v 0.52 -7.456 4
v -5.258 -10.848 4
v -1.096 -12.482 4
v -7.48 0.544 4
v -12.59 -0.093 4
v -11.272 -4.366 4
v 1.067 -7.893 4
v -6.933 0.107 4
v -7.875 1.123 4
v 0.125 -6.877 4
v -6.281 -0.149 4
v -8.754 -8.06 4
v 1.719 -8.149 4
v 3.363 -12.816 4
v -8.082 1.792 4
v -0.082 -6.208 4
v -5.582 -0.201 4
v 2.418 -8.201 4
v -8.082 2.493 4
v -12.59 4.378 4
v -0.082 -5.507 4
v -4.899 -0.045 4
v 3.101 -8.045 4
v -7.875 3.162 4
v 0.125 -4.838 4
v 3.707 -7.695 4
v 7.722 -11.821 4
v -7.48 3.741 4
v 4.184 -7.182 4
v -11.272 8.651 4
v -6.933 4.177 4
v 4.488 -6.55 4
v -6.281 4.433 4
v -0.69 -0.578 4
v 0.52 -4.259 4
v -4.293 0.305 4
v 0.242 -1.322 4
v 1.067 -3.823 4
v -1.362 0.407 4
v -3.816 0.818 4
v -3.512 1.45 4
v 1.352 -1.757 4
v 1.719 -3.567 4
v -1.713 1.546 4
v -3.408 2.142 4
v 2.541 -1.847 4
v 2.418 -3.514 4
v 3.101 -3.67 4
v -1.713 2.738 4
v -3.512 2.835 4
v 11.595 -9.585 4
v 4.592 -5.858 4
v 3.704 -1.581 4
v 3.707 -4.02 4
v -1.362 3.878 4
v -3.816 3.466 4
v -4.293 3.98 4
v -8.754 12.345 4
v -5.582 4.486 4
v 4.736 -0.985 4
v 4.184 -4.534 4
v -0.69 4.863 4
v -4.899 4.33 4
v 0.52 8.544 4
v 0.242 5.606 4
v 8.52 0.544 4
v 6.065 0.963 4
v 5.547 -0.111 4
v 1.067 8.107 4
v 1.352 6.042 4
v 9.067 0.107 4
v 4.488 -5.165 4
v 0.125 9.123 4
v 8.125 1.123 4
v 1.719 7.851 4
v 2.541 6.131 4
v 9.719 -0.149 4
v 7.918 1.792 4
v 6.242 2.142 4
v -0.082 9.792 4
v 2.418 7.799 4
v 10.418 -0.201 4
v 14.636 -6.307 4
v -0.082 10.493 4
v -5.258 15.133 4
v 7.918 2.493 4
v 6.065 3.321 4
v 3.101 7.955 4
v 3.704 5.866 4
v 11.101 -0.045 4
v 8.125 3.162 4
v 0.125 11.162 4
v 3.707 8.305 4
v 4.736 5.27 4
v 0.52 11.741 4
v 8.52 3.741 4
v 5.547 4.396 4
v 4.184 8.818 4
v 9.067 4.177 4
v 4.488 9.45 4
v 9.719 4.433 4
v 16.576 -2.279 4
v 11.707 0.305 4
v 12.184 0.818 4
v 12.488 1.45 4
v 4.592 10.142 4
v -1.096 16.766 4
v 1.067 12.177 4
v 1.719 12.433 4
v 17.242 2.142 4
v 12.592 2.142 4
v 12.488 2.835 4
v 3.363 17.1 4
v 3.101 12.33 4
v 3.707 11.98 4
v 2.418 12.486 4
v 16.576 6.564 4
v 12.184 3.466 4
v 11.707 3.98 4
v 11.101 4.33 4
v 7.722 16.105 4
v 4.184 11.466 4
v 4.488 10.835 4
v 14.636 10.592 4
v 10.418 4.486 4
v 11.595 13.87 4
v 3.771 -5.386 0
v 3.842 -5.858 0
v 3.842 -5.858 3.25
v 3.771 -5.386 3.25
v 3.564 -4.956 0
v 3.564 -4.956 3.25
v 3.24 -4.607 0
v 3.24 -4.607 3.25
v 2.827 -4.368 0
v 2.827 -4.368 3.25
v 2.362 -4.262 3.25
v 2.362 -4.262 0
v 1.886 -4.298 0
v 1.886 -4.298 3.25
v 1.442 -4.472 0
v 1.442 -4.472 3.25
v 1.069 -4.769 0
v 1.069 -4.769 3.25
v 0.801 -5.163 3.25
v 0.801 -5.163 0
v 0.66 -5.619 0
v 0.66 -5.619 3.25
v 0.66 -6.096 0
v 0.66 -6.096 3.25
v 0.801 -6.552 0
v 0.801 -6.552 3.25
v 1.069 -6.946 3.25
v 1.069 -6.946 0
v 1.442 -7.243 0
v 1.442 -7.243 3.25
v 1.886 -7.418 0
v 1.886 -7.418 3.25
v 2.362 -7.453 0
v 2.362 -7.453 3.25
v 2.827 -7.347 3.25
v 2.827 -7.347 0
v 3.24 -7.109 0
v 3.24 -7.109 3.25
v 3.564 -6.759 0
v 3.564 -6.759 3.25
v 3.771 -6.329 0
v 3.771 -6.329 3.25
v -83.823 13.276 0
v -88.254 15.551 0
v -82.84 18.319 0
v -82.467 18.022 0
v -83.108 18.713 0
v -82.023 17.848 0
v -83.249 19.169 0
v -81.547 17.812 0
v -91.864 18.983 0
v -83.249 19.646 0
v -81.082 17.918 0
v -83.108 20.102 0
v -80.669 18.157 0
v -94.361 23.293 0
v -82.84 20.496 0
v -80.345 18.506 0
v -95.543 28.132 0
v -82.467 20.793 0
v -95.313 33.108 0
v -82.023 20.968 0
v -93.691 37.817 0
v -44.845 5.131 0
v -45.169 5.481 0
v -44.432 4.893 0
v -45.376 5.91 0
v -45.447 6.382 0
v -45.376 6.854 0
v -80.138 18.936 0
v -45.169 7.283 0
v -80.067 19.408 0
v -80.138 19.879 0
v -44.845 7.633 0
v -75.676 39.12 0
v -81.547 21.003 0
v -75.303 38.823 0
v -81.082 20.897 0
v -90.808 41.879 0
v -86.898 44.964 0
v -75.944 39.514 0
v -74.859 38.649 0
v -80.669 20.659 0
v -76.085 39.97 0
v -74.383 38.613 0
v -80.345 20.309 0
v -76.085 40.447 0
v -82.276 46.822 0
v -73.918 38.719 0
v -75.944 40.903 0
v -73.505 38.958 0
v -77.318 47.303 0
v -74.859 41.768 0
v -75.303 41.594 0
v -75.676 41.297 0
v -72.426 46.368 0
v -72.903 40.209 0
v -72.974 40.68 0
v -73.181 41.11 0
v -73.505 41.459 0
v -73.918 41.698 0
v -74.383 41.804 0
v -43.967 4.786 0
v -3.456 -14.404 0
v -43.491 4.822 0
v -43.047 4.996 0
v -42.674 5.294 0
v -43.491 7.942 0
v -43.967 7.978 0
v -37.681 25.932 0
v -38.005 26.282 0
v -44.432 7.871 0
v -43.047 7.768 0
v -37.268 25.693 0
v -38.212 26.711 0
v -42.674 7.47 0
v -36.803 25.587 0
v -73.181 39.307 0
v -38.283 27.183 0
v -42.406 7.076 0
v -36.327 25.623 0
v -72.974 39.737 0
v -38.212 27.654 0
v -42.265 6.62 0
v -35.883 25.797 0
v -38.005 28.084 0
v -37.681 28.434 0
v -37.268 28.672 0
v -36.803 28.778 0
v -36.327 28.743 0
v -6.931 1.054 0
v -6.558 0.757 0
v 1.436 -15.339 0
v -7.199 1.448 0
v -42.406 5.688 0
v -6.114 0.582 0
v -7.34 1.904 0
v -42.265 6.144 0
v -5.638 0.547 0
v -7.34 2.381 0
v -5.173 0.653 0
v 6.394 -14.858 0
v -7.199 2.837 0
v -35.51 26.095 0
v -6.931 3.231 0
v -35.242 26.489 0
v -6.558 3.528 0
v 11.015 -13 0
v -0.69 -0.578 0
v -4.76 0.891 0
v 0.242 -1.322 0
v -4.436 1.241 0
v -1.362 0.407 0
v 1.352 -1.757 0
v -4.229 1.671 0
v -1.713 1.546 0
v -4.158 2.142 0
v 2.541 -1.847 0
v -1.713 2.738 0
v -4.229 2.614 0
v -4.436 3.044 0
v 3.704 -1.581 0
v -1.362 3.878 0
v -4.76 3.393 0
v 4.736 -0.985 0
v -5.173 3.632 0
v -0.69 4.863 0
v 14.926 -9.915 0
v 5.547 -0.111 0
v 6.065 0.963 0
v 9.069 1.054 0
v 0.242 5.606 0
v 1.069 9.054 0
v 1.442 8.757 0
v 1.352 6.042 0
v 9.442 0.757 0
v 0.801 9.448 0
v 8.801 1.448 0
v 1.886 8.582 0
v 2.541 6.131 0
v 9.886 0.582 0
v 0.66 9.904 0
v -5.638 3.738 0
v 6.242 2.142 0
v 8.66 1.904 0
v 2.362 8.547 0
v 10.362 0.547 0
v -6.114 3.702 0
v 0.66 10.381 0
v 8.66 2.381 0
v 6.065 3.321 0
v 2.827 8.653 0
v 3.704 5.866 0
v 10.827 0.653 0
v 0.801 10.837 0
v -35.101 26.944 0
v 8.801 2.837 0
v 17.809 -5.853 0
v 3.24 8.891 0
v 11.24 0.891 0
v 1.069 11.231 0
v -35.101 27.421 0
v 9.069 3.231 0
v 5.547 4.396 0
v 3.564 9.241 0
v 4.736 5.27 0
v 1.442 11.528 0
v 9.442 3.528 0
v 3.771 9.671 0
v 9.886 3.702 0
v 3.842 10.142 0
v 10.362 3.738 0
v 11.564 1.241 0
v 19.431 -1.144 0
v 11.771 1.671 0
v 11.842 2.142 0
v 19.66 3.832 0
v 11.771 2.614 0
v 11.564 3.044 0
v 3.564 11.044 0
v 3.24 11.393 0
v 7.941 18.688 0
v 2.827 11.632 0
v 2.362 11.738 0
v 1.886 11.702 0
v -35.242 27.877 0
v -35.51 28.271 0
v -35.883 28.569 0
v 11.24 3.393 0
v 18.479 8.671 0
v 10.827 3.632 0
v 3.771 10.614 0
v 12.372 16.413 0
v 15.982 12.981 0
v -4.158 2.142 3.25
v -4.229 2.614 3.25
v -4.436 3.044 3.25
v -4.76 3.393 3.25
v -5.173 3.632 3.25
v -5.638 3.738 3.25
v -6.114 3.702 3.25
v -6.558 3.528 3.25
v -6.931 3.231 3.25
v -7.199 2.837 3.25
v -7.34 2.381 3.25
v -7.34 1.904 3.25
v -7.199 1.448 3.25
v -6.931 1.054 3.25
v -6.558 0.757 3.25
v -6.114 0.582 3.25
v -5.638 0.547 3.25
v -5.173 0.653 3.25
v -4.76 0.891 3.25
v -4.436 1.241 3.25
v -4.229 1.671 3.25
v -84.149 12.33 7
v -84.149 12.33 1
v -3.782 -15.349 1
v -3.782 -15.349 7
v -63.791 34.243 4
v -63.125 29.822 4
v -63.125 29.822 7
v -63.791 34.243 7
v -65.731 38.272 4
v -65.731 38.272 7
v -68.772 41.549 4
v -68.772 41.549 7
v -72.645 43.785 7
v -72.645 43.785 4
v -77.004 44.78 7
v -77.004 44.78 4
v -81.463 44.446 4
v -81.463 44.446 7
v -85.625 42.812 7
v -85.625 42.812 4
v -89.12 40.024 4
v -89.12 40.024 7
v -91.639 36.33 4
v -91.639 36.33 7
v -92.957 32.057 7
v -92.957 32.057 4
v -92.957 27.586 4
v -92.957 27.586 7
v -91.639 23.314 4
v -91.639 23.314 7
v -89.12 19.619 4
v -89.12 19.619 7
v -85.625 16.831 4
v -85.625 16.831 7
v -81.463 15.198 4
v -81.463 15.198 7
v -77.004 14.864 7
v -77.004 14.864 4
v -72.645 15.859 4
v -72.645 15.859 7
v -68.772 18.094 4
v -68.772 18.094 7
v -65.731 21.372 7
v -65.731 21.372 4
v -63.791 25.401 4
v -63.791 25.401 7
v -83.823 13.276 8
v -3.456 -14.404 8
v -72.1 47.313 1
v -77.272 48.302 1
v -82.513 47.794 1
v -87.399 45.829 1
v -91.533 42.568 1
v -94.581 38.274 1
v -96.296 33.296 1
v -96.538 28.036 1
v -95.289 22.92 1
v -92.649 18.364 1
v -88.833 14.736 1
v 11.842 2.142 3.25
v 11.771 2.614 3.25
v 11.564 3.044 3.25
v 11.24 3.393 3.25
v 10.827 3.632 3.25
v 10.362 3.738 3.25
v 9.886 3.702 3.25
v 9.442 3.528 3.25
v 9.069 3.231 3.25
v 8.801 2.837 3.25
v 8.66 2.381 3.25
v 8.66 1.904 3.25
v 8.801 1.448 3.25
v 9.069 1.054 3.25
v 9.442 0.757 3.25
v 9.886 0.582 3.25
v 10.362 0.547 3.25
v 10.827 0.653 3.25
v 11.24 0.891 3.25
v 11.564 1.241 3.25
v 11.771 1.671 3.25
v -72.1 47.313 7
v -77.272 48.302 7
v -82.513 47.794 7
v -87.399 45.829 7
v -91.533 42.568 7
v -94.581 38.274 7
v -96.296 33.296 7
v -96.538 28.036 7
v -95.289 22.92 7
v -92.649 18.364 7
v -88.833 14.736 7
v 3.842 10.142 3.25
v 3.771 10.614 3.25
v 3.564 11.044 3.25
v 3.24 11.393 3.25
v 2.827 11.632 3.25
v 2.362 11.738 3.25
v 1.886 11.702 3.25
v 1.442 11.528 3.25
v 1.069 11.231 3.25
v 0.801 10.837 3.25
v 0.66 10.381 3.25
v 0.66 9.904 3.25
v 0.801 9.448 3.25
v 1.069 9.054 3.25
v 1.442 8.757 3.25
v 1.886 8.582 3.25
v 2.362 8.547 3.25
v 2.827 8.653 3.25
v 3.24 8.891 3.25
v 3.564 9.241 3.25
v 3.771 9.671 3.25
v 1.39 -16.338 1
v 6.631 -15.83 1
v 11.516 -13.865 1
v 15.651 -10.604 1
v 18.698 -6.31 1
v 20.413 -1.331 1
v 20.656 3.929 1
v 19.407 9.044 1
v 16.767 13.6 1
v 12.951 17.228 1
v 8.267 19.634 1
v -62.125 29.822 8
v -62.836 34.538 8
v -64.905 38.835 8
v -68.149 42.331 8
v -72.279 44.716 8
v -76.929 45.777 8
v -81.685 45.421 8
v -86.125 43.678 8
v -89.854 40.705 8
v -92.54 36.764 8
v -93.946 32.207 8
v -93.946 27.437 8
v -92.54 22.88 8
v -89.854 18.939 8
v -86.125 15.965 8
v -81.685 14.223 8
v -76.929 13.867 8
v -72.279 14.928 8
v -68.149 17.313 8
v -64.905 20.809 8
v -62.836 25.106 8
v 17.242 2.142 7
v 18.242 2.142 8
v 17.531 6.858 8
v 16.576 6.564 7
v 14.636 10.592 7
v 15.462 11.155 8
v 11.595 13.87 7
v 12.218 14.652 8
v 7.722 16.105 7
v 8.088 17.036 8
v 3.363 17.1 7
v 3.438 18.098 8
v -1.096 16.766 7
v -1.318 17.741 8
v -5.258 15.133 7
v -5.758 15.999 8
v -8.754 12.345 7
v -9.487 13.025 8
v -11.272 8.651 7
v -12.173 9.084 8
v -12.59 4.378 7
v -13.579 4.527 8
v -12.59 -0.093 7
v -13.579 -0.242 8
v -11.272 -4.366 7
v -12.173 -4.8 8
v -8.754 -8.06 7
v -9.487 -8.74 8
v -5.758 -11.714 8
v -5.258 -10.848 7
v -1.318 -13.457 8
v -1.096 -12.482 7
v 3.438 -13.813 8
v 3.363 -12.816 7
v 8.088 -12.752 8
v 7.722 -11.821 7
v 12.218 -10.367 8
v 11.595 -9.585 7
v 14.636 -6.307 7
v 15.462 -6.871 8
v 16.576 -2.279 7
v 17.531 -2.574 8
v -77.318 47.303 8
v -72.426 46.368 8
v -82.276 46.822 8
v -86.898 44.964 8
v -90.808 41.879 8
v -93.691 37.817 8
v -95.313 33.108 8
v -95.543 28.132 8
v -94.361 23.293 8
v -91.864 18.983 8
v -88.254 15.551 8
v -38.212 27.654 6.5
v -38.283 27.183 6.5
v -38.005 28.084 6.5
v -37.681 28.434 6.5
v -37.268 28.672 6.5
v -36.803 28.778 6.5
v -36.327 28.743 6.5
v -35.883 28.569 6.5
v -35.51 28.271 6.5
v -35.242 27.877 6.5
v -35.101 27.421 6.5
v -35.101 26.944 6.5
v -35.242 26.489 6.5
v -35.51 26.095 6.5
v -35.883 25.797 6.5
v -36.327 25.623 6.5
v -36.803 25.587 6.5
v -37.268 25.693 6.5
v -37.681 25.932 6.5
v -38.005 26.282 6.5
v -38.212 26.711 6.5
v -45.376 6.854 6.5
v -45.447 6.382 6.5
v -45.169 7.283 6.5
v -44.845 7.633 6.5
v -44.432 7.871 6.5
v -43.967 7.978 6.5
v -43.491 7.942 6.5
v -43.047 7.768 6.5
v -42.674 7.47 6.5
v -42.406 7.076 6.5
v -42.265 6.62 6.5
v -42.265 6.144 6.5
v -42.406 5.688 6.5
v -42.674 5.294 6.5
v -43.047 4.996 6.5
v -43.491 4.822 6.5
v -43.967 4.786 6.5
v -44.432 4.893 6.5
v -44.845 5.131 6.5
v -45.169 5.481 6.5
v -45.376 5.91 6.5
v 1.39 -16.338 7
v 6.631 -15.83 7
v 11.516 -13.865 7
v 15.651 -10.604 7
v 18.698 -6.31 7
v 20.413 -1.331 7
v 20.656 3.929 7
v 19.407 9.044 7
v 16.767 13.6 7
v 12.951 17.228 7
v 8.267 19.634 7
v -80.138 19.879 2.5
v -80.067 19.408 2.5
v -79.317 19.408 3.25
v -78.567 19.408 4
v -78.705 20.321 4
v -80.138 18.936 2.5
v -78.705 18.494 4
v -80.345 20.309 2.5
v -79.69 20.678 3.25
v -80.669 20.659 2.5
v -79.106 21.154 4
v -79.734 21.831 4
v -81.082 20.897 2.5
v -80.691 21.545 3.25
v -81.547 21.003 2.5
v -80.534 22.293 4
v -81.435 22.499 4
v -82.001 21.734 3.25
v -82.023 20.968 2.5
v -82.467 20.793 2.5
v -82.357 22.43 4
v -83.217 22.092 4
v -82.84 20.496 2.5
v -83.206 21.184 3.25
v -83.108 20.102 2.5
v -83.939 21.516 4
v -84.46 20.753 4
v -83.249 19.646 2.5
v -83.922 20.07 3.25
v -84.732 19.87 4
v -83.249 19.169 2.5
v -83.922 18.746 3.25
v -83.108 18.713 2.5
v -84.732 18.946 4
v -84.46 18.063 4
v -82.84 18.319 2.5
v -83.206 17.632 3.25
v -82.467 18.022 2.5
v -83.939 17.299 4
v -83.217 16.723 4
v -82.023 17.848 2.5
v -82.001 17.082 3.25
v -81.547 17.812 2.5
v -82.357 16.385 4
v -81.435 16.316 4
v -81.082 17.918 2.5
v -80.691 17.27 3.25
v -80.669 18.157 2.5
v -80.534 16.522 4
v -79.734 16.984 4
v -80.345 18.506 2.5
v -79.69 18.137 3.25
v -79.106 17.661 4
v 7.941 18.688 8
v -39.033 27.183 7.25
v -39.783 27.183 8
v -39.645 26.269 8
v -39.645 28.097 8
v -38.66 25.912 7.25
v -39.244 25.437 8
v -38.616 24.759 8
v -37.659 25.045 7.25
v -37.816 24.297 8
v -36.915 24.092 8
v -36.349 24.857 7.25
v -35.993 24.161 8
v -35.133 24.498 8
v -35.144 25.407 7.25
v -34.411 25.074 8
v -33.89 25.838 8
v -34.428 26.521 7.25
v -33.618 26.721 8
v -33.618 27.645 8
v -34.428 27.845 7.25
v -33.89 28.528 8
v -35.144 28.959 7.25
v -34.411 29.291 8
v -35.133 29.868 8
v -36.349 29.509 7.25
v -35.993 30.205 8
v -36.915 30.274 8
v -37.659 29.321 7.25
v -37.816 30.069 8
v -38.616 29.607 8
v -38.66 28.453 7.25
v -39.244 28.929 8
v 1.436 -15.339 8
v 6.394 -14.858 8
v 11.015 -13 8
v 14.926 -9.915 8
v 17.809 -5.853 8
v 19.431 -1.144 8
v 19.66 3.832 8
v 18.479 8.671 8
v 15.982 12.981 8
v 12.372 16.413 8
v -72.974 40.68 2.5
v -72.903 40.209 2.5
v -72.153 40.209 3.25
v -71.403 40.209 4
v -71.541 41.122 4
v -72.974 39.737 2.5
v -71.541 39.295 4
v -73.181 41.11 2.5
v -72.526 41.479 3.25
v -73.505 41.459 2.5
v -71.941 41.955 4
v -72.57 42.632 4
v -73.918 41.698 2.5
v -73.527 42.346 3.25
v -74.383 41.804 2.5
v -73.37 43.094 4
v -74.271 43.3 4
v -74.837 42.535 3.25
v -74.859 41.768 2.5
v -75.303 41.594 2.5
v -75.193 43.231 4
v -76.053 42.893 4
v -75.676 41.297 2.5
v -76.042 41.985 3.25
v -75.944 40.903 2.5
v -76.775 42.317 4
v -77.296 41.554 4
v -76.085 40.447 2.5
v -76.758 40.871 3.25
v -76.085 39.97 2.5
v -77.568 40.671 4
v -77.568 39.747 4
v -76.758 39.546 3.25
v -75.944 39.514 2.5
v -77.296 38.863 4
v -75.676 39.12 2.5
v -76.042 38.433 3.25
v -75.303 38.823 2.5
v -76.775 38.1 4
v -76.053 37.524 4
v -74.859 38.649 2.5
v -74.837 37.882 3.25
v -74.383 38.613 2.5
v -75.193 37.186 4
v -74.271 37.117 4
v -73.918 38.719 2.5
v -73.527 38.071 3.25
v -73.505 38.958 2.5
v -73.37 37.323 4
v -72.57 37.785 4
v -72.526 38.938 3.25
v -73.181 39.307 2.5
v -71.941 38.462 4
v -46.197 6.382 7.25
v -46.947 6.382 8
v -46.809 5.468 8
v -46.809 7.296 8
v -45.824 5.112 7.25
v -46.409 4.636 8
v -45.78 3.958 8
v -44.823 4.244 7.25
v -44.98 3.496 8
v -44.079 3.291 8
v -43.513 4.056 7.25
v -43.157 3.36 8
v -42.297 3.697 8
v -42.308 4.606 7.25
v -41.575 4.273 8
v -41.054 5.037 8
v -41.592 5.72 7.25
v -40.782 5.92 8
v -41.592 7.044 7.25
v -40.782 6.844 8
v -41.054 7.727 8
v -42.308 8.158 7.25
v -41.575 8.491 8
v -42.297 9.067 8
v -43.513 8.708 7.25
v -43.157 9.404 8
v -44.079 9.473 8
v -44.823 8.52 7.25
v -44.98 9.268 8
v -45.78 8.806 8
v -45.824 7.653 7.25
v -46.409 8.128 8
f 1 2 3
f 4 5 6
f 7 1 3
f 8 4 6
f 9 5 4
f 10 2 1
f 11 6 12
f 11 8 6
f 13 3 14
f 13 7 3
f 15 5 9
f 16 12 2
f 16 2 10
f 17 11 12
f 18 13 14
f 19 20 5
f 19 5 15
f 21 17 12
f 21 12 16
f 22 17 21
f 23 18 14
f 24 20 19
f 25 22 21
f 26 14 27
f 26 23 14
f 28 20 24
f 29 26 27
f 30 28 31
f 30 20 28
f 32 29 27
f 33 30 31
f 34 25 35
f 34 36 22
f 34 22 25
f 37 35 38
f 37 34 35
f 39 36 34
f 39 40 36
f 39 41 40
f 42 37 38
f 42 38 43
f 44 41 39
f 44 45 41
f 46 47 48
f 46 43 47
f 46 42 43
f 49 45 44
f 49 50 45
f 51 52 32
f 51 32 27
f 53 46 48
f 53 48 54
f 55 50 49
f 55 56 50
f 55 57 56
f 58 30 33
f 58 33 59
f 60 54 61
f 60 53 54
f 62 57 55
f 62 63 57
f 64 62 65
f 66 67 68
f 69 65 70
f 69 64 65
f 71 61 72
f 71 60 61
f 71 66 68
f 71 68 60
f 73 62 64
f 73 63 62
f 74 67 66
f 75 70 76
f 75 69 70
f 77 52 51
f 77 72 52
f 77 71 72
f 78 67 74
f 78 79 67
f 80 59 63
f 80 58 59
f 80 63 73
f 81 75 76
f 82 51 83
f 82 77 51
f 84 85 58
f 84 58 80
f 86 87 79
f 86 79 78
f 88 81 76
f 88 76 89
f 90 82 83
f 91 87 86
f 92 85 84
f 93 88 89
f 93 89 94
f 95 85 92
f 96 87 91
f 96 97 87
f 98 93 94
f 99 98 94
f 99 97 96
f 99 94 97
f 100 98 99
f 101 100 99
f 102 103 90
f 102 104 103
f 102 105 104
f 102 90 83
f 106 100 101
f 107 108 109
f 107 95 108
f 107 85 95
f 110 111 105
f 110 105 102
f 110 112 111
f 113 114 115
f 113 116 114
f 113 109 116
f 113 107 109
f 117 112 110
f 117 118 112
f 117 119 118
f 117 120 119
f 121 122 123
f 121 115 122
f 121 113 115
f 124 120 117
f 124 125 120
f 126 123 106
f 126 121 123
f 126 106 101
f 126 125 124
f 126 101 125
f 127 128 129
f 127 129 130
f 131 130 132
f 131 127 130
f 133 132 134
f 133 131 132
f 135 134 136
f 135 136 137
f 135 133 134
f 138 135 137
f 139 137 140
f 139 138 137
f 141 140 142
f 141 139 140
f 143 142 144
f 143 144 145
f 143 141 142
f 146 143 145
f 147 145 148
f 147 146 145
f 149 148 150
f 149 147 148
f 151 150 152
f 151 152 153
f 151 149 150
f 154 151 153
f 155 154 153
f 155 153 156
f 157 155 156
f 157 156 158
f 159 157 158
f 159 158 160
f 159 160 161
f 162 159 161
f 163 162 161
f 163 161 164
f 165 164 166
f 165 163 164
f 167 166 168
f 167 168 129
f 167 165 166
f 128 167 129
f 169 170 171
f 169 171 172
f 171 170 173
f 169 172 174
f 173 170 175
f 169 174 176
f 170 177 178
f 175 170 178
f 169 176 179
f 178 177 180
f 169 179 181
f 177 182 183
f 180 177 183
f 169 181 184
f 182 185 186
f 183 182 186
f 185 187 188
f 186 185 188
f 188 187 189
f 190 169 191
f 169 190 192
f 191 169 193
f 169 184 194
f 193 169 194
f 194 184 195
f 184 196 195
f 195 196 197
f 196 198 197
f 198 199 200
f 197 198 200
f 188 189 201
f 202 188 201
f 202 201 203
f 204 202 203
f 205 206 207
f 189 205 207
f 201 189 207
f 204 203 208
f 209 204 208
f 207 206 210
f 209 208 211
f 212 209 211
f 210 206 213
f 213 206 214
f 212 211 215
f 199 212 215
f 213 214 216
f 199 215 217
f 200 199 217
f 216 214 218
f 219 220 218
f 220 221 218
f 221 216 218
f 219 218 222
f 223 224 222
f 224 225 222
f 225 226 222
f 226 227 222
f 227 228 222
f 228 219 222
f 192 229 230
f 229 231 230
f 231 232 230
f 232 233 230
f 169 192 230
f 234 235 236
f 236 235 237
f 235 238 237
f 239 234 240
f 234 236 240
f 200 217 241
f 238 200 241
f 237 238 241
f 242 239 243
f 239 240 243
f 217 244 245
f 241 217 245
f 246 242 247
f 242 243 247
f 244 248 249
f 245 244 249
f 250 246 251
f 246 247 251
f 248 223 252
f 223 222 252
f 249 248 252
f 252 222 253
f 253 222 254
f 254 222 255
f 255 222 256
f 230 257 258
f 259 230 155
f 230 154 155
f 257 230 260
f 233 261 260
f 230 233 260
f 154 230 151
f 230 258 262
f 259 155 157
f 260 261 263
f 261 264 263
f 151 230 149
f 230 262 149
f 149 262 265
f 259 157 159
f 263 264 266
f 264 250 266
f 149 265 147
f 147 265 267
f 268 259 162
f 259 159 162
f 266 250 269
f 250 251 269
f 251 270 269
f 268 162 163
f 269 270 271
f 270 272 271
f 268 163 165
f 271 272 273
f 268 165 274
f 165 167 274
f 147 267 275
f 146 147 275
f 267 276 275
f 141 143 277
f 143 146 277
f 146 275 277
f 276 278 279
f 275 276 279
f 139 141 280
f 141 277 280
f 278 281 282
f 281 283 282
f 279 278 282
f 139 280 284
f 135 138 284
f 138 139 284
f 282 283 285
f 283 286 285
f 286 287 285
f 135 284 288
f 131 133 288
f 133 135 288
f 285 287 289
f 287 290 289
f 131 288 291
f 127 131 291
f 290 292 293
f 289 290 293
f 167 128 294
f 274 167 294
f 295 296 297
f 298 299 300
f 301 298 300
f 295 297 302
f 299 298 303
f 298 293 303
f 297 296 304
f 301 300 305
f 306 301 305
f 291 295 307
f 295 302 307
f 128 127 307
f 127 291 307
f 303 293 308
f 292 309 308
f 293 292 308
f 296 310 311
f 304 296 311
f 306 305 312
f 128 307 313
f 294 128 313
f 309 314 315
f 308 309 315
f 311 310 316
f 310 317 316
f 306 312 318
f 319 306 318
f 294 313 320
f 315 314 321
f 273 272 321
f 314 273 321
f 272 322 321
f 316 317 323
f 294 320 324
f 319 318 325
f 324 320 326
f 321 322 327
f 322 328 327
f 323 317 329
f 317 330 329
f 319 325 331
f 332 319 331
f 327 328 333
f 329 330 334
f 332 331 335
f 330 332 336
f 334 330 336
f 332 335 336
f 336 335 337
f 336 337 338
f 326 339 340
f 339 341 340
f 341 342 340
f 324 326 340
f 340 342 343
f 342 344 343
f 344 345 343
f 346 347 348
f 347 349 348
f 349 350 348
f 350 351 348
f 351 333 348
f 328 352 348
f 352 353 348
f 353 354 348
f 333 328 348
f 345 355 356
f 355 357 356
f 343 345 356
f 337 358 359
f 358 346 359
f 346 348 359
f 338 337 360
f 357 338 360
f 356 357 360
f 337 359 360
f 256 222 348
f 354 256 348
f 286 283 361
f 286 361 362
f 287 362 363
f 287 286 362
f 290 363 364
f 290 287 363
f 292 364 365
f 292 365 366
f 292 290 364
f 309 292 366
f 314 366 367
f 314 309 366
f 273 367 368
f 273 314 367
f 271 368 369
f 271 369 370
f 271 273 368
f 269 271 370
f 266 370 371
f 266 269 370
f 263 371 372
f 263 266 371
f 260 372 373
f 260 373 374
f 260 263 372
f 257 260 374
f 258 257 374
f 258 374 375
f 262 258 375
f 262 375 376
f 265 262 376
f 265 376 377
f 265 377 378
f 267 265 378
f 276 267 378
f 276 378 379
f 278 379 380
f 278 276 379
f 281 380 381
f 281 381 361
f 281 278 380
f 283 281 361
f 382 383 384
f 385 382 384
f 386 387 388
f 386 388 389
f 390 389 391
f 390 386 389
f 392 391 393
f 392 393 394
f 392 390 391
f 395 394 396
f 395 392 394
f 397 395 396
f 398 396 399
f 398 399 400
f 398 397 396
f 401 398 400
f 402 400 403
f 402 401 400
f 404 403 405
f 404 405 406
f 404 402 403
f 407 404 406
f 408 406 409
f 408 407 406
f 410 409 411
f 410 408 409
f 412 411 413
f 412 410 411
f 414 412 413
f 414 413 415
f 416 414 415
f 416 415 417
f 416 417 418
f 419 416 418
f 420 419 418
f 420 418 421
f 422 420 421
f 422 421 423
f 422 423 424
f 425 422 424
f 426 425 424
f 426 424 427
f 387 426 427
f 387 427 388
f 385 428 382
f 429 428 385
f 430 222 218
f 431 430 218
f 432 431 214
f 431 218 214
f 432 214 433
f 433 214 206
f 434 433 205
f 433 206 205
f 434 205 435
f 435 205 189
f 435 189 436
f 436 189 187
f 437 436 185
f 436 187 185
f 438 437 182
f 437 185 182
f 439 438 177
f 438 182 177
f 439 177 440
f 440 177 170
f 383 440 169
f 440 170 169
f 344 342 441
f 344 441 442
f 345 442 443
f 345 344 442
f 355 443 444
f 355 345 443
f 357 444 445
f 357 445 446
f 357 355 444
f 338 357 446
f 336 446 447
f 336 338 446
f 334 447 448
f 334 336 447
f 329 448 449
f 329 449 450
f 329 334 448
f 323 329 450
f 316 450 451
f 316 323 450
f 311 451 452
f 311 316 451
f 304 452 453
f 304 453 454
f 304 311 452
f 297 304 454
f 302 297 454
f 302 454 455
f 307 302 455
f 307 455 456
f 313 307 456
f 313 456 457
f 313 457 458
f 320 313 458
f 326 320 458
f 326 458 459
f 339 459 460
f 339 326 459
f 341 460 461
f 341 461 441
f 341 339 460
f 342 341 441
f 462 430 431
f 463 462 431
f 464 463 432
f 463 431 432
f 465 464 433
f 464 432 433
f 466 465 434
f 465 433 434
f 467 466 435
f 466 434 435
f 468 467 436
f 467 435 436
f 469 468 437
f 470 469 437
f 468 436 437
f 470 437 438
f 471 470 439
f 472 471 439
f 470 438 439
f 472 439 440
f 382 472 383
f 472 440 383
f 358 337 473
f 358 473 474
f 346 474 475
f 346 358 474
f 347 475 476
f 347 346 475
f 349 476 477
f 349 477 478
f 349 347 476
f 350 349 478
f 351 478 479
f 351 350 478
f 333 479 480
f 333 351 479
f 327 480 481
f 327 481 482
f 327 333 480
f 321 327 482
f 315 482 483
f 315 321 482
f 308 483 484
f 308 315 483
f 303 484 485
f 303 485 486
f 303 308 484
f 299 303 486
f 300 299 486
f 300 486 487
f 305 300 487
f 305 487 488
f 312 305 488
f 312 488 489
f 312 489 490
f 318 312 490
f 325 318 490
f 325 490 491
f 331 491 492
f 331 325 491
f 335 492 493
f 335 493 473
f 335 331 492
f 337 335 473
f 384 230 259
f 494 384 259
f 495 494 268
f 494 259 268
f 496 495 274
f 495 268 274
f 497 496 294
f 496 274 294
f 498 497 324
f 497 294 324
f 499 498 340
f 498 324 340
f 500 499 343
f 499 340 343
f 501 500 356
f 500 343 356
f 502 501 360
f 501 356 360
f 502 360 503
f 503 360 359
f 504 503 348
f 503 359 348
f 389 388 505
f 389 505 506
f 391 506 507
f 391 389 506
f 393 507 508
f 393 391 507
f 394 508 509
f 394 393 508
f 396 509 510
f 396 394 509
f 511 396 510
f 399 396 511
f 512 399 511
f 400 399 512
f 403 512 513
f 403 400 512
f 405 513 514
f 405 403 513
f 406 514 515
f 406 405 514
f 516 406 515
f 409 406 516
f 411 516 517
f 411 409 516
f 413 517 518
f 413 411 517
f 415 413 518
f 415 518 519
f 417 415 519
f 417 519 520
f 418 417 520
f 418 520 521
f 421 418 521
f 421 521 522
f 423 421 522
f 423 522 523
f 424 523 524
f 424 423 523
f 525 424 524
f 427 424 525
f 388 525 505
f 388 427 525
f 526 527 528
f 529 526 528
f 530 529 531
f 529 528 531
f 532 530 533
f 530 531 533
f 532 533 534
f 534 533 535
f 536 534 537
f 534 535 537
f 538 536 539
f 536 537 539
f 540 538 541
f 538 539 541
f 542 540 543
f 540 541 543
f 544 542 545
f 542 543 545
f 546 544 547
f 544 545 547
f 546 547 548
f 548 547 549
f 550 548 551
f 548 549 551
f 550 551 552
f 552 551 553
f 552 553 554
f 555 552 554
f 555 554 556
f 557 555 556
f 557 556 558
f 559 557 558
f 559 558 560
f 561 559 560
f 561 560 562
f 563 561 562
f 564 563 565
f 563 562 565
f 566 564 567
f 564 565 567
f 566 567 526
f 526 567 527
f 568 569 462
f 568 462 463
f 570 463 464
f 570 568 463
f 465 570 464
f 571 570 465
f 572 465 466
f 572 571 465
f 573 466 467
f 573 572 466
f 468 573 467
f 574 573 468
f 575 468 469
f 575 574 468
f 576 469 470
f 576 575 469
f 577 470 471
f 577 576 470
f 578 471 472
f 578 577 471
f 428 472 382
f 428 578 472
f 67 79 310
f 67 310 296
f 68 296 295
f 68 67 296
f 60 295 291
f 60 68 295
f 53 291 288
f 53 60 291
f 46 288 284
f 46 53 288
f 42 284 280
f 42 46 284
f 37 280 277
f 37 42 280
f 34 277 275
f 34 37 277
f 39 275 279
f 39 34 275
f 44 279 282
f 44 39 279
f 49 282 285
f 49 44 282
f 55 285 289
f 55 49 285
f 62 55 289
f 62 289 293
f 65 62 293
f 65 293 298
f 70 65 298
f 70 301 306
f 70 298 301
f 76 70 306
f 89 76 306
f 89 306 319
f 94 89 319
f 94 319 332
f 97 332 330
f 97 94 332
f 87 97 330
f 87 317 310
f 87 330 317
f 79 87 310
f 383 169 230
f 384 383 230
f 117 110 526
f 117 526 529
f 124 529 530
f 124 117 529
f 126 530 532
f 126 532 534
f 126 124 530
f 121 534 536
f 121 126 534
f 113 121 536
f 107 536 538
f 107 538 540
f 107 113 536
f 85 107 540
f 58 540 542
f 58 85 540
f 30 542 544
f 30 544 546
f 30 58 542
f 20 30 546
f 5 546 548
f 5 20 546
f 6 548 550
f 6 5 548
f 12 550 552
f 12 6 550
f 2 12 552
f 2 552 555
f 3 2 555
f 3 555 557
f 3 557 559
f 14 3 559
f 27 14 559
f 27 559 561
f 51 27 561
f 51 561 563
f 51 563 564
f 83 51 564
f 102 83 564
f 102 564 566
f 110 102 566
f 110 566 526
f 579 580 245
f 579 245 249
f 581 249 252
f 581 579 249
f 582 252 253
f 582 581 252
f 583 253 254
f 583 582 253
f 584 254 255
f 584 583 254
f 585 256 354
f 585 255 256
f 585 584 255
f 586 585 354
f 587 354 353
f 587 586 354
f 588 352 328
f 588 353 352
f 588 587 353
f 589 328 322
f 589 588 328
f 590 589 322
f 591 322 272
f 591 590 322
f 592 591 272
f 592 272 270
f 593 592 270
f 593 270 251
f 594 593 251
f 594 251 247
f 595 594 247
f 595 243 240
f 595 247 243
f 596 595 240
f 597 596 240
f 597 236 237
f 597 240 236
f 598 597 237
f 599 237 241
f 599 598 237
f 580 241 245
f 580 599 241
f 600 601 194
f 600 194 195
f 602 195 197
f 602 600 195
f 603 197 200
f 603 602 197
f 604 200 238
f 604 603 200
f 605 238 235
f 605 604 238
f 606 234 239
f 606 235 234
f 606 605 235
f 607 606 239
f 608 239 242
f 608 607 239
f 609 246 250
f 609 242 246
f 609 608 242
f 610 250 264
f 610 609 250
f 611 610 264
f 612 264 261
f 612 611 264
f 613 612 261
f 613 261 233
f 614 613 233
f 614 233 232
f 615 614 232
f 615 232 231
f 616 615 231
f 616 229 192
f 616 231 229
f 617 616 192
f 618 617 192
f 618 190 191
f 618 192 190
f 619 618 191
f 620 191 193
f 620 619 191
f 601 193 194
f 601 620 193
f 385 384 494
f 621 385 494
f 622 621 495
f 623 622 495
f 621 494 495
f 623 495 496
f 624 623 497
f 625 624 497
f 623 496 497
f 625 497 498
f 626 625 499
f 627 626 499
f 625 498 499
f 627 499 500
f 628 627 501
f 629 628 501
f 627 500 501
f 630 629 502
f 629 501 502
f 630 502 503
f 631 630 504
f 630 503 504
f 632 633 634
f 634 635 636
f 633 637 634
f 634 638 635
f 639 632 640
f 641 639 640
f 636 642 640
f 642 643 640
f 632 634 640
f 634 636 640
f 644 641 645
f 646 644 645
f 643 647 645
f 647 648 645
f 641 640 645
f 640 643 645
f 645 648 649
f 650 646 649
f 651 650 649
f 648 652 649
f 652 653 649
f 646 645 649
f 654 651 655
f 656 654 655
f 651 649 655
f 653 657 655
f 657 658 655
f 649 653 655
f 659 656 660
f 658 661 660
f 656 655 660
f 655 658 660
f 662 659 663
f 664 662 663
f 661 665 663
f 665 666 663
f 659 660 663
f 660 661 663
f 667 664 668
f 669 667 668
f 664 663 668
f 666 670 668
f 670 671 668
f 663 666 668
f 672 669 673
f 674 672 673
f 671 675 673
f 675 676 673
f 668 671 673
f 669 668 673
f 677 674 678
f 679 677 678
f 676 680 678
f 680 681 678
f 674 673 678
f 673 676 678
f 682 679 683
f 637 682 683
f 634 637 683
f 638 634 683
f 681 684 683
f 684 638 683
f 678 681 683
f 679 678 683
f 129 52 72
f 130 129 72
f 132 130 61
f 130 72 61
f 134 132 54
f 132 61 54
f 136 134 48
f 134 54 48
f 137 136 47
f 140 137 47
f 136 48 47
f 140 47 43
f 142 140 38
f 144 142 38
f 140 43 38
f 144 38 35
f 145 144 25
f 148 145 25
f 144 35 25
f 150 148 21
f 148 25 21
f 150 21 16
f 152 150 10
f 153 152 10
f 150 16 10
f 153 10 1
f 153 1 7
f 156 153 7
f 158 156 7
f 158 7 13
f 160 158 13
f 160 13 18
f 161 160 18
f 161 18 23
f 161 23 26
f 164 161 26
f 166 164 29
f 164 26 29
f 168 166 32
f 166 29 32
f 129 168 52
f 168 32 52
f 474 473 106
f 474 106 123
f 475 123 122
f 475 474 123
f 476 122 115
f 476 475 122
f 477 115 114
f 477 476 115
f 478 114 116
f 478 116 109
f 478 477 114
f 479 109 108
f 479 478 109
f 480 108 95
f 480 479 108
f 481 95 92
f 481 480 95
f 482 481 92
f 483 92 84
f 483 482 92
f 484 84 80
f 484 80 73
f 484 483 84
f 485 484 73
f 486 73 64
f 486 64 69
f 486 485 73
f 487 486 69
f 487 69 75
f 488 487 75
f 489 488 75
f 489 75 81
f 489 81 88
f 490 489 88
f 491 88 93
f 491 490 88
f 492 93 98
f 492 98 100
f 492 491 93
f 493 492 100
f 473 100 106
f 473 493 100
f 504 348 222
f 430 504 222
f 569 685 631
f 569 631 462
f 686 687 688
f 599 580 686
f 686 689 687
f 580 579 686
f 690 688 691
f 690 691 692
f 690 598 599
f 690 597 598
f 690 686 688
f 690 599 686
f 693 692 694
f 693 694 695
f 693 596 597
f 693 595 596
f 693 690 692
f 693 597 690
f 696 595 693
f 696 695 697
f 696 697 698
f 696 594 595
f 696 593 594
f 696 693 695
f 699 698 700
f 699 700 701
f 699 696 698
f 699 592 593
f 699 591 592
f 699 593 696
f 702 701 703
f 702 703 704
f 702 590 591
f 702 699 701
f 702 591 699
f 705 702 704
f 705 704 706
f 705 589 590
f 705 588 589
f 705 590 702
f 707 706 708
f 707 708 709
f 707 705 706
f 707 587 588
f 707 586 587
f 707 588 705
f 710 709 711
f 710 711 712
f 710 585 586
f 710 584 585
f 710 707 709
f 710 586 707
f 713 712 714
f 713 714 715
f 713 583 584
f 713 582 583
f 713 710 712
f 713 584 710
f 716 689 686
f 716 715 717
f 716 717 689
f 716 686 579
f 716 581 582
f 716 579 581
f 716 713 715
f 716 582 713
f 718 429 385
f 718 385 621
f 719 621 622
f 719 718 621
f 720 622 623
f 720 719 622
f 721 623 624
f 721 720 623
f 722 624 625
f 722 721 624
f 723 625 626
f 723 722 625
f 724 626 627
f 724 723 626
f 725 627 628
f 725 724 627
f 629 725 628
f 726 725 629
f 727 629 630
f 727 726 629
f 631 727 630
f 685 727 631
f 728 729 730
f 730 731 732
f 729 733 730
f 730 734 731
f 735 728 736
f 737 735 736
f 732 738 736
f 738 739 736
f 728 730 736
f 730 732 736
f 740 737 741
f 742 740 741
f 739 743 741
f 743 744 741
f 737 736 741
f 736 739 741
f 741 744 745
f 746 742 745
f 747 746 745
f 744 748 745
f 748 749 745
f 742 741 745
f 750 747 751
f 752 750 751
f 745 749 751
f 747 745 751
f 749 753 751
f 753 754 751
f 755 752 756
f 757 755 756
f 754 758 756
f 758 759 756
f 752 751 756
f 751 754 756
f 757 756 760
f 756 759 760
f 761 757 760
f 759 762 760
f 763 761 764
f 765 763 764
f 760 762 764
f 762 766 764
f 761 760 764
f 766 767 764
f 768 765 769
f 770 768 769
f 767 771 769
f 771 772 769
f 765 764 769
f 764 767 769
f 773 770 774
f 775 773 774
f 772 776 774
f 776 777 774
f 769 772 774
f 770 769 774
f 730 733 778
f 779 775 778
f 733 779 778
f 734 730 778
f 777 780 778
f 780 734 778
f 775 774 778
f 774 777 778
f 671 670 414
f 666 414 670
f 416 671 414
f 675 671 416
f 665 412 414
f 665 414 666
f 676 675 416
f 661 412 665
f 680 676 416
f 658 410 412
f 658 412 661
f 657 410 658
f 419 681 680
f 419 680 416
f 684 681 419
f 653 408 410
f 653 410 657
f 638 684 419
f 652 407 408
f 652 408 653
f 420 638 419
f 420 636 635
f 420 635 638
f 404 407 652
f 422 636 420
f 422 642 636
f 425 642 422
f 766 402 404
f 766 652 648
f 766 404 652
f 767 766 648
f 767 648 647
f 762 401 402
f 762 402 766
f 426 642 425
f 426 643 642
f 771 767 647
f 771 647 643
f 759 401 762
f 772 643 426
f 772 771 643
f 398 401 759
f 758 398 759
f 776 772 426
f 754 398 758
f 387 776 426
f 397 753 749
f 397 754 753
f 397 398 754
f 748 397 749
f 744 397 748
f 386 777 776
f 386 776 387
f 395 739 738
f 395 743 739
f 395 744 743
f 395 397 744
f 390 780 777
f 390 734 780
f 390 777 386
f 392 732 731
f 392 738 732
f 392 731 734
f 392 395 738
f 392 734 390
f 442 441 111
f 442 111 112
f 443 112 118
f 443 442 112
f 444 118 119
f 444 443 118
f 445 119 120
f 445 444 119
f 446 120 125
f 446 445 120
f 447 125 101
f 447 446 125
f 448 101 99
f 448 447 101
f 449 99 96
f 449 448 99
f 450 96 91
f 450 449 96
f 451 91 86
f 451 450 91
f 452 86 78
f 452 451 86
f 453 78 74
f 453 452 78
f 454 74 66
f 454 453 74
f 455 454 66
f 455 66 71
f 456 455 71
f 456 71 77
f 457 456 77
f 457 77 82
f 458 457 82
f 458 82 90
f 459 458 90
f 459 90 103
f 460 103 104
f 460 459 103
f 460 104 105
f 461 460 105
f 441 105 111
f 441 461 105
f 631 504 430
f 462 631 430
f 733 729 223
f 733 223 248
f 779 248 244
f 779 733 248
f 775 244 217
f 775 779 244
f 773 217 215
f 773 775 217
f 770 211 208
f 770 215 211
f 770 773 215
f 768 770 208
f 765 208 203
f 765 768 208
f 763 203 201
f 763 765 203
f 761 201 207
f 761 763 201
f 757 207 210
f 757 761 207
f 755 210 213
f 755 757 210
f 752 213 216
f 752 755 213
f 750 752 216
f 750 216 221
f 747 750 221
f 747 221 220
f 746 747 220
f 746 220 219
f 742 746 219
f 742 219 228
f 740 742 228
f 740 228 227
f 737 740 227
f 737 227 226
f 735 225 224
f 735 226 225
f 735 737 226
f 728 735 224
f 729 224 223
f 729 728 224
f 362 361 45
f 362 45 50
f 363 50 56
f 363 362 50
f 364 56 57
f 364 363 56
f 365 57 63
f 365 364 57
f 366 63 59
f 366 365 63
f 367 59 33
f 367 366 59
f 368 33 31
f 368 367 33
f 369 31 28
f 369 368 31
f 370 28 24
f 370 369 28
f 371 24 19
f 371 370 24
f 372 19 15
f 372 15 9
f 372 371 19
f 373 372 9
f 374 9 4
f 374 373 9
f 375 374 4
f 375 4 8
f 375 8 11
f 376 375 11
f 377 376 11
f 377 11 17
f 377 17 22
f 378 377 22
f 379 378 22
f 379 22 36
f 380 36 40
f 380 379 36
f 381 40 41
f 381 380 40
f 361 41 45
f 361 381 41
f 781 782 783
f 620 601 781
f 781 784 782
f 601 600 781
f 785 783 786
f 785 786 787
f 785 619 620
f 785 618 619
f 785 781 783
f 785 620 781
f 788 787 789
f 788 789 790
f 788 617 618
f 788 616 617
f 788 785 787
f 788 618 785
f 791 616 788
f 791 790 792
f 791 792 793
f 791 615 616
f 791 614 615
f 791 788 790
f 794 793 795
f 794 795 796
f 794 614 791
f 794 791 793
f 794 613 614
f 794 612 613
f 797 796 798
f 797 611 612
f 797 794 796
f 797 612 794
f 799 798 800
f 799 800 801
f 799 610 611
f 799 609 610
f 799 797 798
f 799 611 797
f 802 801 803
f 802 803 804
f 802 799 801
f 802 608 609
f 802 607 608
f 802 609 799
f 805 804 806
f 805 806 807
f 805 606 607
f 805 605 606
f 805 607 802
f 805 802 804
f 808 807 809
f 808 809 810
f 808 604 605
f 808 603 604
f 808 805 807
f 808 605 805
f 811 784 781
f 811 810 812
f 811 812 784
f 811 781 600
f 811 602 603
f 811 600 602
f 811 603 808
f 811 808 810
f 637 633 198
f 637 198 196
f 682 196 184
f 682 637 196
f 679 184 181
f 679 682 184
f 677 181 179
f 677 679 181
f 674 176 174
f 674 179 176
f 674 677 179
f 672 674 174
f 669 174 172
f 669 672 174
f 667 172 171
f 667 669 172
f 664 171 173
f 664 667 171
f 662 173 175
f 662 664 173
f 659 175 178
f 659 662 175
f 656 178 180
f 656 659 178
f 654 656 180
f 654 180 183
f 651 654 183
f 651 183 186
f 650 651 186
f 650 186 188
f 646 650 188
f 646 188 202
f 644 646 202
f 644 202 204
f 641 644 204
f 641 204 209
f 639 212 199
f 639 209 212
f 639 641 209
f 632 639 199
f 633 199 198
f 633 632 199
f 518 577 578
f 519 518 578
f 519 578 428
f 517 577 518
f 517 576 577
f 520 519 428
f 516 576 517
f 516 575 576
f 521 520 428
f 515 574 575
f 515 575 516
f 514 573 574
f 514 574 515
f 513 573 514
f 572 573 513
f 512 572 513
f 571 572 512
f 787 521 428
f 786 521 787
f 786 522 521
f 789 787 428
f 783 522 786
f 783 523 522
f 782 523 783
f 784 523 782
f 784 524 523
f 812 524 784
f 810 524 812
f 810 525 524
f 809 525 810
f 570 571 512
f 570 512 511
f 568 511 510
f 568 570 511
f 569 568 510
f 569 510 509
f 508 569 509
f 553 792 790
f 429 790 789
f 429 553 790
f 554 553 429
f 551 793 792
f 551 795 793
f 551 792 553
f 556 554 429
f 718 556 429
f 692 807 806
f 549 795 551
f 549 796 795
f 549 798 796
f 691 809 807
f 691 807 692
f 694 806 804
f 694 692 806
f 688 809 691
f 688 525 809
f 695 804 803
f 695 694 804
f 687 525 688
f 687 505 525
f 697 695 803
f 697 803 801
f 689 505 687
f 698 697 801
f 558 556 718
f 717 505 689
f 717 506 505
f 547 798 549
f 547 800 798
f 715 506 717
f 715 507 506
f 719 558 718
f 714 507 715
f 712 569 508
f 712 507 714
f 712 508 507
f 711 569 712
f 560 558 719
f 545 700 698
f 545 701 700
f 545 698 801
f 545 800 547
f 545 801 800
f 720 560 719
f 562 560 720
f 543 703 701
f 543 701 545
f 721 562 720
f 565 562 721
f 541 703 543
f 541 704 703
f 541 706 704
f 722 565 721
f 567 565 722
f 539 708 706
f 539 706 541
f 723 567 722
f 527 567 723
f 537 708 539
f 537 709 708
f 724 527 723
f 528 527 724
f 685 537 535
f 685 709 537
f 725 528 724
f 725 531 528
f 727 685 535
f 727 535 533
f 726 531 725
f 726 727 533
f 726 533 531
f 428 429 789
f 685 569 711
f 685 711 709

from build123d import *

# Parameters (mm, degrees)
SKETCH1_R               = 15
BOSS_EXTRUDE1_DEPTH     = 8
SKETCH1_5_R             = 15
SKETCH1_5_R_2           = 1.6
BOSS_EXTRUDE4_DEPTH     = 4
CHAMFER1_SIZE           = 0.75
CHAMFER3_SIZE           = 1
CUT_EXTRUDE1_DEPTH      = 109.32973067
CUT_EXTRUDE1_DEPTH_BACK = 109.32973067
SKETCH8_R               = 4
CUT_EXTRUDE2_DEPTH      = 109.32973067
CUT_EXTRUDE2_DEPTH_BACK = 109.32973067
SKETCH10_R              = 1.6
CHAMFER4_SIZE           = 1.5
CHAMFER5_SIZE           = 1
CHAMFER6_SIZE           = 1


with BuildPart() as part:
    # Sketch1 → Boss-Extrude1 (new body)
    with BuildSketch(Plane.XY):
        with BuildLine():
            ThreePointArc((-72.100325672, 47.313455418), (-95.616319813, 35.84619683), (-84.149061225, 12.330202688))
            Line((-84.149061225, 12.330202688), (-3.782129278, -15.349324934))
            ThreePointArc((-3.782129278, -15.349324934), (19.733864864, -3.882066346), (8.266606276, 19.633927796))
            Line((8.266606276, 19.633927796), (-72.100325672, 47.313455418))
        make_face()
        with Locations((2.242238499, 2.142301431)):
            Circle(SKETCH1_R, mode=Mode.SUBTRACT)
        with Locations((-78.124693448, 29.821829053)):
            Circle(SKETCH1_R, mode=Mode.SUBTRACT)
    extrude(amount=BOSS_EXTRUDE1_DEPTH)

    # Sketch1<5> → Boss-Extrude4 (add)
    # profile 1 of 2: a face of its own
    with BuildSketch(Plane.XY):
        with Locations((2.242238499, 2.142301431)):
            Circle(SKETCH1_5_R)
        with Locations((2.242238499, -5.857698569)):
            Circle(SKETCH1_5_R_2, mode=Mode.SUBTRACT)
        with Locations((-5.757761501, 2.142301431)):
            Circle(SKETCH1_5_R_2, mode=Mode.SUBTRACT)
        with Locations((10.242238499, 2.142301431)):
            Circle(SKETCH1_5_R_2, mode=Mode.SUBTRACT)
        with Locations((2.242238499, 10.142301431)):
            Circle(SKETCH1_5_R_2, mode=Mode.SUBTRACT)
    # profile 2 of 2: a face of its own
    with BuildSketch(Plane.XY):
        with Locations((-78.124693448, 29.821829053)):
            Circle(SKETCH1_5_R)
    extrude(amount=BOSS_EXTRUDE4_DEPTH)

    # Chamfer1
    chamfer1_edges = [part.edges().sort_by_distance(p)[0] for p in [
        (-7.357761501, 2.142301431, 4),
        (0.642238499, -5.857698569, 4),
        (8.642238499, 2.142301431, 4),
        (0.642238499, 10.142301431, 4),
    ]]
    chamfer(chamfer1_edges, length=CHAMFER1_SIZE)

    # Chamfer3
    chamfer3_edges = [part.edges().sort_by_distance(p)[0] for p in [
        (-12.757761501, 2.142301431, 8),
        (-93.124693448, 29.821829053, 8),
    ]]
    chamfer(chamfer3_edges, length=CHAMFER3_SIZE)

    # Sketch8 → Cut-Extrude1 (cut, two sides: drawn at the far end of the back side and taken through both)
    with BuildSketch(Plane(origin=(0, 0, 0), x_dir=(-1, 0, 0), z_dir=(0, 0, -1)).offset(-CUT_EXTRUDE1_DEPTH_BACK)):
        with Locations((-2.242238499, 2.142301431)):
            Circle(SKETCH8_R)
    extrude(amount=CUT_EXTRUDE1_DEPTH + CUT_EXTRUDE1_DEPTH_BACK, mode=Mode.SUBTRACT)

    # Sketch10 → Cut-Extrude2 (cut, two sides: drawn at the far end of the back side and taken through both)
    with BuildSketch(Plane(origin=(0, 0, 0), x_dir=(-1, 0, 0), z_dir=(0, 0, -1)).offset(-CUT_EXTRUDE2_DEPTH_BACK)):
        with Locations((74.502789559, 40.208531531)):
            Circle(SKETCH10_R)
        with Locations((36.683056878, 27.182871474)):
            Circle(SKETCH10_R)
        with Locations((81.66690259, 19.407678557)):
            Circle(SKETCH10_R)
        with Locations((43.847169909, 6.382018499)):
            Circle(SKETCH10_R)
    extrude(amount=CUT_EXTRUDE2_DEPTH + CUT_EXTRUDE2_DEPTH_BACK, mode=Mode.SUBTRACT)

    # Chamfer4
    chamfer4_edges = [part.edges().sort_by_distance(p)[0] for p in [
        (-72.902789559, 40.208531531, 4),
        (-42.247169909, 6.382018499, 8),
        (-35.083056878, 27.182871474, 8),
        (-80.06690259, 19.407678557, 4),
    ]]
    chamfer(chamfer4_edges, length=CHAMFER4_SIZE)

    # Chamfer5
    chamfer5_edges = [part.edges().sort_by_distance(p)[0] for p in [
        (-31.916859698, 33.473691607, 0),
        (-95.616319813, 35.84619683, 0),
        (19.733864864, -3.882066346, 0),
        (-43.965595251, -1.509561123, 0),
    ]]
    chamfer(chamfer5_edges, length=CHAMFER5_SIZE)

    # Chamfer6
    chamfer6_edges = [part.edges().sort_by_distance(p)[0] for p in [
        (-31.916859698, 33.473691607, 8),
        (-95.616319813, 35.84619683, 8),
        (19.733864864, -3.882066346, 8),
        (-43.965595251, -1.509561123, 8),
    ]]
    chamfer(chamfer6_edges, length=CHAMFER6_SIZE)


solid = part.part
